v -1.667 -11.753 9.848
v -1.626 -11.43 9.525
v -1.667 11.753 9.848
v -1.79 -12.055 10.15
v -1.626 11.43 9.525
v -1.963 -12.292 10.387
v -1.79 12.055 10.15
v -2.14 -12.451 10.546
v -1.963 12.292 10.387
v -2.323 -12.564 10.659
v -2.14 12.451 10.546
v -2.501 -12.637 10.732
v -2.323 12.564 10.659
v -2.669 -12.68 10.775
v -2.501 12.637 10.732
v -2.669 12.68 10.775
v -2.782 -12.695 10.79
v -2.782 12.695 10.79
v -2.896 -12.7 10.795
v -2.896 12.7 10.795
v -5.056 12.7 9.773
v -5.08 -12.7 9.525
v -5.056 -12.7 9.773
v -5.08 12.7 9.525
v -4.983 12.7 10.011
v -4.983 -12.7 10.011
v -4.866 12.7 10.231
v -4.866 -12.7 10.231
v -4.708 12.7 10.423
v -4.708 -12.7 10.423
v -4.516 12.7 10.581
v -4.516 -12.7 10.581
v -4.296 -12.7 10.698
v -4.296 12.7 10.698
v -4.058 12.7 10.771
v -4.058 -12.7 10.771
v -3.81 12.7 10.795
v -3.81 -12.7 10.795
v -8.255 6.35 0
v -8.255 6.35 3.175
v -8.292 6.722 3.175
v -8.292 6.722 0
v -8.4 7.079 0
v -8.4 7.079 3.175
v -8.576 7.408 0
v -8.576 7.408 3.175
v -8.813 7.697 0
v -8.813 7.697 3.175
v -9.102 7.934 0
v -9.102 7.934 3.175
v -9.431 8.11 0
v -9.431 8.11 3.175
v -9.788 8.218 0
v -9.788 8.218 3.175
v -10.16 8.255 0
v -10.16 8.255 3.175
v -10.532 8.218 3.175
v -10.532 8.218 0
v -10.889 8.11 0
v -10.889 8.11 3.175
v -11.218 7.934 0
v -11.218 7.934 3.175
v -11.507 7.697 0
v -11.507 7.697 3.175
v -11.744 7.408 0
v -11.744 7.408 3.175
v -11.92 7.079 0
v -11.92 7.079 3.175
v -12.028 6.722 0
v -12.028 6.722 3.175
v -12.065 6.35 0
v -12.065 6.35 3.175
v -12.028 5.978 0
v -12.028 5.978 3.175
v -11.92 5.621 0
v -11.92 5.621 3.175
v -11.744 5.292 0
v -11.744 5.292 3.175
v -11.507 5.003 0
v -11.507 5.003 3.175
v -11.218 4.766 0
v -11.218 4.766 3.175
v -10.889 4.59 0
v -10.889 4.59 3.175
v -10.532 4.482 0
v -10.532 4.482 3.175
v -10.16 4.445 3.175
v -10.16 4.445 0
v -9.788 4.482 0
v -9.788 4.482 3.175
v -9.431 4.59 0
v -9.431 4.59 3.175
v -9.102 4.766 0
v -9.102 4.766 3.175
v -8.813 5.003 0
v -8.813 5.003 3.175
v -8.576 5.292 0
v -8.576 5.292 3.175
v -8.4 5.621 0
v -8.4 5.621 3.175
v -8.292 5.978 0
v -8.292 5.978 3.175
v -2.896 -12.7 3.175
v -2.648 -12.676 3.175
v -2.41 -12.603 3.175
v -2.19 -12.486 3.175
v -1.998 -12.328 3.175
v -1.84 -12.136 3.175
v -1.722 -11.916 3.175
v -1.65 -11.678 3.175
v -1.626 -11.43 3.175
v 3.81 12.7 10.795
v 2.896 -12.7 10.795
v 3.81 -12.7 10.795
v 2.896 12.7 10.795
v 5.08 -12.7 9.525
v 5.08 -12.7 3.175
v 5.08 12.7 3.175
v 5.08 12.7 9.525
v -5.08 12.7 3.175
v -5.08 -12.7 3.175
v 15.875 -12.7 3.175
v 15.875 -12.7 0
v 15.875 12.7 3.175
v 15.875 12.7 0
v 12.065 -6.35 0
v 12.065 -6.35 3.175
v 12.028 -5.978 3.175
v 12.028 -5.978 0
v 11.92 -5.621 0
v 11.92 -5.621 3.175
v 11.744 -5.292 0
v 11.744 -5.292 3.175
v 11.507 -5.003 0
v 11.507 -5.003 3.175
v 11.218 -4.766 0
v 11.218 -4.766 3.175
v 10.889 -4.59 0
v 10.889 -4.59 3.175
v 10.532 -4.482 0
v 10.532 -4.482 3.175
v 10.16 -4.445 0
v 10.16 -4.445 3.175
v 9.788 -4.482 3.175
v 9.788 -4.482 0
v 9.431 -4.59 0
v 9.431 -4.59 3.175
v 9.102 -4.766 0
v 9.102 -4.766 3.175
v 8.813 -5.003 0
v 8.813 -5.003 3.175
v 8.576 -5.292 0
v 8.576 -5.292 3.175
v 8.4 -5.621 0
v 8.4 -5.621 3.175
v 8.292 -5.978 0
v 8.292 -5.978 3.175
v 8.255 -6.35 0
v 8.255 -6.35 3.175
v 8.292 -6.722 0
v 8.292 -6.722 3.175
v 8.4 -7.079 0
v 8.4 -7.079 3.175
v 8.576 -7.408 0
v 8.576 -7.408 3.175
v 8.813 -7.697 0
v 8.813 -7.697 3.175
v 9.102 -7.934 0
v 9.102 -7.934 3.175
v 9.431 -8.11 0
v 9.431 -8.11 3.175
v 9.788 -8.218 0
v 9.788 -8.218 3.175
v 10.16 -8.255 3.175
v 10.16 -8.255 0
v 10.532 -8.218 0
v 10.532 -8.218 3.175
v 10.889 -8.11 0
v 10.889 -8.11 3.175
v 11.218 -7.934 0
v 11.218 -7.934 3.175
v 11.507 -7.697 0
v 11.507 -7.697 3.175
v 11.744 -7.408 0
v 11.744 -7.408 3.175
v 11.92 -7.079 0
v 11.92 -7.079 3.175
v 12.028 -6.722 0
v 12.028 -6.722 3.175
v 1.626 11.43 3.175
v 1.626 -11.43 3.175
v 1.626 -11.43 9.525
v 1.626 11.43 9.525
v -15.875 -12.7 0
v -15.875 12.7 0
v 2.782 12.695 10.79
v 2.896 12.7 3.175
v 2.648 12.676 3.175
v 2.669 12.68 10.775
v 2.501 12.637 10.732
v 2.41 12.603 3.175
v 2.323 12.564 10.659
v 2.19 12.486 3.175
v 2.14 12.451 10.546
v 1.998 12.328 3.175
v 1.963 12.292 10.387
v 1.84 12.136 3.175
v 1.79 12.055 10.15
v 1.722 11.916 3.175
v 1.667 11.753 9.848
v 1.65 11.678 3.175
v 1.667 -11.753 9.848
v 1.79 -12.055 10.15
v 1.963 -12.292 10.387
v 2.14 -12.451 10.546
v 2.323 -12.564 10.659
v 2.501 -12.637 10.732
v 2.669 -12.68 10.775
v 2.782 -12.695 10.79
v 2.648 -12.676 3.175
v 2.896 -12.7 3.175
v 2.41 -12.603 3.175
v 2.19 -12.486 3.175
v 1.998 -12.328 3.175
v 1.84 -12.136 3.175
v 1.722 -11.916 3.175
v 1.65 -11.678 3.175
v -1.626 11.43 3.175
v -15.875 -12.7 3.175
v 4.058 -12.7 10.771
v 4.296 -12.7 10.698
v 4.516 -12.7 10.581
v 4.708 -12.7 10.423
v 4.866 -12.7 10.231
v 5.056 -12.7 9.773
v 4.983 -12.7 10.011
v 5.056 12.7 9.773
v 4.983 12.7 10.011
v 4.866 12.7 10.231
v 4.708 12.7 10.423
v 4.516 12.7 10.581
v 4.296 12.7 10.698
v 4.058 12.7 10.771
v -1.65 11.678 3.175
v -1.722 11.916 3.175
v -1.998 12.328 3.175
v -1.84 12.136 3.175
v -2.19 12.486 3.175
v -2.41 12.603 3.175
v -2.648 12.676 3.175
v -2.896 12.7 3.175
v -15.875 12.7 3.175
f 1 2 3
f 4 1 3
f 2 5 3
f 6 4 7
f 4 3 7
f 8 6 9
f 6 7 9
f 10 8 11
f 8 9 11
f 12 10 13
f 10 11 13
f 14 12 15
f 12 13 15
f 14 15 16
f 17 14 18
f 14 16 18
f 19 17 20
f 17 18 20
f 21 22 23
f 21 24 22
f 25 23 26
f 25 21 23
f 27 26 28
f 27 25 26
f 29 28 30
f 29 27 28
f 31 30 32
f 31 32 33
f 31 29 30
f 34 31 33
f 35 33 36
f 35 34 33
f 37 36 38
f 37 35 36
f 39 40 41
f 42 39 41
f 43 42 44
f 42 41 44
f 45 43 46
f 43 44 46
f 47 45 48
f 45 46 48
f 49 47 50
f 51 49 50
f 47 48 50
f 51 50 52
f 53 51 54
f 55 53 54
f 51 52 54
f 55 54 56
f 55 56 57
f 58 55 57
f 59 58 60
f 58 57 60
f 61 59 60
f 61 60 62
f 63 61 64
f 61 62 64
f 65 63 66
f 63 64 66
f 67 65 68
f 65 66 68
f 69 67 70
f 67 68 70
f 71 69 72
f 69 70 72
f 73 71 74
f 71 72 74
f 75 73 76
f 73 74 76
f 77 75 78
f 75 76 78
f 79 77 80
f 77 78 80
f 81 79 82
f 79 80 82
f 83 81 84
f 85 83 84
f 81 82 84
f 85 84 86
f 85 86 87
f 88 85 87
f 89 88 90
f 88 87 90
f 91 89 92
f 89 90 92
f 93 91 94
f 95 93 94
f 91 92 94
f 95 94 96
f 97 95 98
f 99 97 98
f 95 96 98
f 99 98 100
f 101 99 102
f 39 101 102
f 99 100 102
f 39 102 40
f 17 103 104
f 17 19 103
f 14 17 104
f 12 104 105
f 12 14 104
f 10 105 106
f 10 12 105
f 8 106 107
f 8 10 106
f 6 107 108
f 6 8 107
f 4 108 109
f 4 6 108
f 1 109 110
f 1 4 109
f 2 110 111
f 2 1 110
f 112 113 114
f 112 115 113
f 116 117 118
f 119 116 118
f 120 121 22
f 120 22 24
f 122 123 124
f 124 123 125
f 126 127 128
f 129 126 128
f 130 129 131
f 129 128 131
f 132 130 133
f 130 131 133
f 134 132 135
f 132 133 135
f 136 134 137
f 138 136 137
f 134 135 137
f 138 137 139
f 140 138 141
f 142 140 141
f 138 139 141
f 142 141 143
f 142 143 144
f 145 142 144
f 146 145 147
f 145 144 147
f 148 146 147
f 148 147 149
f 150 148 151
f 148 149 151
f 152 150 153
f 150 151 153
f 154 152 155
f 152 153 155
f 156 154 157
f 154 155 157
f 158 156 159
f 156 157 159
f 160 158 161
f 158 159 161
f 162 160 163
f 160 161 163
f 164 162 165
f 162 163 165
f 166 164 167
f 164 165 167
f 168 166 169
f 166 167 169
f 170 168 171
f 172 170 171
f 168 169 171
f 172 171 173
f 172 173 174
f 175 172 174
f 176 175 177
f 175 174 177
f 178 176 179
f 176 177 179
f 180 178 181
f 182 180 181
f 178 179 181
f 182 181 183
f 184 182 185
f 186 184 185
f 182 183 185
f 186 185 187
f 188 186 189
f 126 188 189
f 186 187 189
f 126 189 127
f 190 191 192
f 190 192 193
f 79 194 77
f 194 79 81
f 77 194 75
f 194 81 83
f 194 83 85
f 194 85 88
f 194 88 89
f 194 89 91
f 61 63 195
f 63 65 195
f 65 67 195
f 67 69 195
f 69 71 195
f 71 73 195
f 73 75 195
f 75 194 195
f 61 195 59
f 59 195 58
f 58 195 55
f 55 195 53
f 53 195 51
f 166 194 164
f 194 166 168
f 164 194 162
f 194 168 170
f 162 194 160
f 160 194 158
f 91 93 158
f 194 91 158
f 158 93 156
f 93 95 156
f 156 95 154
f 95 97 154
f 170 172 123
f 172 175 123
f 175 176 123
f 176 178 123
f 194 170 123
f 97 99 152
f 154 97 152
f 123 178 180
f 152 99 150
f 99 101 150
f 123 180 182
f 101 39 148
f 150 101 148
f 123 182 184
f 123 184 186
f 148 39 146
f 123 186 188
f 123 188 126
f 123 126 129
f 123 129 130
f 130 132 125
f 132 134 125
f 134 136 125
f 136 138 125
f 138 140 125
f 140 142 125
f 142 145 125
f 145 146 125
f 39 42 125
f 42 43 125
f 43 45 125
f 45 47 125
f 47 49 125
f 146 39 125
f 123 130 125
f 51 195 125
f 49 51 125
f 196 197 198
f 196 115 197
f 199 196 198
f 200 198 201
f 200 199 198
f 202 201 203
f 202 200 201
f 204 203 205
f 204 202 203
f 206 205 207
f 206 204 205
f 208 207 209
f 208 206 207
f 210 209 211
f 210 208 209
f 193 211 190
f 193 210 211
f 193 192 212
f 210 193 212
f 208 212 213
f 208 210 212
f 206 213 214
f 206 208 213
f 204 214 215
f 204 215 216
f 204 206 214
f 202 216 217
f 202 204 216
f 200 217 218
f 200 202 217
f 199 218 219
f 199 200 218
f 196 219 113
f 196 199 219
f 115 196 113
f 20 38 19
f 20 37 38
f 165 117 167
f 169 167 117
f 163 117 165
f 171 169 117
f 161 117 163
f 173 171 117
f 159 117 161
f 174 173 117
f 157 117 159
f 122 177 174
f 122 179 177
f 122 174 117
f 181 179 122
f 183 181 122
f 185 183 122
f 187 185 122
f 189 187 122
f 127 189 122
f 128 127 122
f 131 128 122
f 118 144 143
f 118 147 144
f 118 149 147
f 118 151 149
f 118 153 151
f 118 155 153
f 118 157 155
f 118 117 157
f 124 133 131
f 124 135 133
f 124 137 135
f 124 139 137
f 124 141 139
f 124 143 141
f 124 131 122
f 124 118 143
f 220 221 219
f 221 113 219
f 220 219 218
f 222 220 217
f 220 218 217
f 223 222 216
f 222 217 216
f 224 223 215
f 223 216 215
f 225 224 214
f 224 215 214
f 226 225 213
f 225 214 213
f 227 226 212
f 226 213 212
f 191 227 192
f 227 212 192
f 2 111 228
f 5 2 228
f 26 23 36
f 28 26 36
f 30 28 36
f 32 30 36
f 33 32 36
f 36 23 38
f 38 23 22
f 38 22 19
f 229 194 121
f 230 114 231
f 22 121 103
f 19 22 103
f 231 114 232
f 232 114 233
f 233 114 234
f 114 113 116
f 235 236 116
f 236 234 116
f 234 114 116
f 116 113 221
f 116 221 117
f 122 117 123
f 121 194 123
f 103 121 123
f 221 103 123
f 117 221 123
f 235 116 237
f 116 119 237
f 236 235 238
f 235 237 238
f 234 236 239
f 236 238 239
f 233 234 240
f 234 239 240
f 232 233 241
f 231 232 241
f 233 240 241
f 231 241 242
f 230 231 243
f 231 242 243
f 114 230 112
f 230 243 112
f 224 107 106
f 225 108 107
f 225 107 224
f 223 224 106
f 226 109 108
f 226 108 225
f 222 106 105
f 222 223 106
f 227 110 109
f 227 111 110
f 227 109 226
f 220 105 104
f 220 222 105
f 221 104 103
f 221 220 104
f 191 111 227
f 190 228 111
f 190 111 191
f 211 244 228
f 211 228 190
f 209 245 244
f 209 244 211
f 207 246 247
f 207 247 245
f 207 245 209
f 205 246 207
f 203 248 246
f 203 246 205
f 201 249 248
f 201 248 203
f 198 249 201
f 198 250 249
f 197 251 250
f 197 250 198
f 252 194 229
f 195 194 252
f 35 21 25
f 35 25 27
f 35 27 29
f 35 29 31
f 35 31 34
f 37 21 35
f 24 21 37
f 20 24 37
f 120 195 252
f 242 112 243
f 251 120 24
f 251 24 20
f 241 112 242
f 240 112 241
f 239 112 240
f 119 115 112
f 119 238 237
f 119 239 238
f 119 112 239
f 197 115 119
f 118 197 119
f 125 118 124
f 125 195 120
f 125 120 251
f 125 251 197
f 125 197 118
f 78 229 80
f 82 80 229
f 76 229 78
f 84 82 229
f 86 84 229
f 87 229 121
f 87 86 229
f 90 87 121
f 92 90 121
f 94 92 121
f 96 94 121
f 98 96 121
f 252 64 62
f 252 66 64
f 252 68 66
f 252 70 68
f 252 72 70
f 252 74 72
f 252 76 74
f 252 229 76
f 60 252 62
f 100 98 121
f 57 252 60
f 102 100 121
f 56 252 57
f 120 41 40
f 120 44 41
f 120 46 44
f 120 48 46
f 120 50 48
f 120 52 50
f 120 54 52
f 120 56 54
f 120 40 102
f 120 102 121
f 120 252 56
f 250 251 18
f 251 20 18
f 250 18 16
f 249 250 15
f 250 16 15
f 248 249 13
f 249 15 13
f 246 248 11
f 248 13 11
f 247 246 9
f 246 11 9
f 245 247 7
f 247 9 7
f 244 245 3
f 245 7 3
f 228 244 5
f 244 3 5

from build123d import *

# Parameters (mm, degrees)
F0_W     = 31.75
F0_H     = 25.4
F1_DEPTH = 3.175
F2_W     = 3.4544
F2_H     = 25.4
F3_DEPTH = 7.62
F4_R     = 1.27
F5_R     = 1.905
F6_DEPTH = 3.175


with BuildPart() as f1:
    # F0 (on Top) → F1 (new body)
    with BuildSketch(Plane.XY):
        Rectangle(F0_W, F0_H)
    extrude(amount=F1_DEPTH)

    # F2 (on face) → F3 (join)
    with BuildSketch(Plane.XY.offset(3.175)):
        with Locations((-3.3528, 0)):
            Rectangle(F2_W, F2_H)
        with Locations((3.3528, 0)):
            Rectangle(F2_W, F2_H)
    extrude(amount=F3_DEPTH)

    # F4
    f4_edges = [f1.edges().sort_by_distance(p)[0] for p in [
        (-1.6256, 0, 10.795),
        (-5.08, 0, 10.795),
        (1.6256, 0, 10.795),
        (5.08, 0, 10.795),
        (1.6256, 12.7, 6.985),
        (-1.6256, 12.7, 6.985),
        (1.6256, -12.7, 6.985),
        (-1.6256, -12.7, 6.985),
    ]]
    fillet(f4_edges, radius=F4_R)

    # F5 (on face) → F6 (cut, through all)
    with BuildSketch(Plane.XY.offset(3.175)):
        with Locations((-10.16, 6.35)):
            Circle(F5_R)
        with Locations((10.16, -6.35)):
            Circle(F5_R)
    extrude(amount=-F6_DEPTH, mode=Mode.SUBTRACT)


solid = f1.part
